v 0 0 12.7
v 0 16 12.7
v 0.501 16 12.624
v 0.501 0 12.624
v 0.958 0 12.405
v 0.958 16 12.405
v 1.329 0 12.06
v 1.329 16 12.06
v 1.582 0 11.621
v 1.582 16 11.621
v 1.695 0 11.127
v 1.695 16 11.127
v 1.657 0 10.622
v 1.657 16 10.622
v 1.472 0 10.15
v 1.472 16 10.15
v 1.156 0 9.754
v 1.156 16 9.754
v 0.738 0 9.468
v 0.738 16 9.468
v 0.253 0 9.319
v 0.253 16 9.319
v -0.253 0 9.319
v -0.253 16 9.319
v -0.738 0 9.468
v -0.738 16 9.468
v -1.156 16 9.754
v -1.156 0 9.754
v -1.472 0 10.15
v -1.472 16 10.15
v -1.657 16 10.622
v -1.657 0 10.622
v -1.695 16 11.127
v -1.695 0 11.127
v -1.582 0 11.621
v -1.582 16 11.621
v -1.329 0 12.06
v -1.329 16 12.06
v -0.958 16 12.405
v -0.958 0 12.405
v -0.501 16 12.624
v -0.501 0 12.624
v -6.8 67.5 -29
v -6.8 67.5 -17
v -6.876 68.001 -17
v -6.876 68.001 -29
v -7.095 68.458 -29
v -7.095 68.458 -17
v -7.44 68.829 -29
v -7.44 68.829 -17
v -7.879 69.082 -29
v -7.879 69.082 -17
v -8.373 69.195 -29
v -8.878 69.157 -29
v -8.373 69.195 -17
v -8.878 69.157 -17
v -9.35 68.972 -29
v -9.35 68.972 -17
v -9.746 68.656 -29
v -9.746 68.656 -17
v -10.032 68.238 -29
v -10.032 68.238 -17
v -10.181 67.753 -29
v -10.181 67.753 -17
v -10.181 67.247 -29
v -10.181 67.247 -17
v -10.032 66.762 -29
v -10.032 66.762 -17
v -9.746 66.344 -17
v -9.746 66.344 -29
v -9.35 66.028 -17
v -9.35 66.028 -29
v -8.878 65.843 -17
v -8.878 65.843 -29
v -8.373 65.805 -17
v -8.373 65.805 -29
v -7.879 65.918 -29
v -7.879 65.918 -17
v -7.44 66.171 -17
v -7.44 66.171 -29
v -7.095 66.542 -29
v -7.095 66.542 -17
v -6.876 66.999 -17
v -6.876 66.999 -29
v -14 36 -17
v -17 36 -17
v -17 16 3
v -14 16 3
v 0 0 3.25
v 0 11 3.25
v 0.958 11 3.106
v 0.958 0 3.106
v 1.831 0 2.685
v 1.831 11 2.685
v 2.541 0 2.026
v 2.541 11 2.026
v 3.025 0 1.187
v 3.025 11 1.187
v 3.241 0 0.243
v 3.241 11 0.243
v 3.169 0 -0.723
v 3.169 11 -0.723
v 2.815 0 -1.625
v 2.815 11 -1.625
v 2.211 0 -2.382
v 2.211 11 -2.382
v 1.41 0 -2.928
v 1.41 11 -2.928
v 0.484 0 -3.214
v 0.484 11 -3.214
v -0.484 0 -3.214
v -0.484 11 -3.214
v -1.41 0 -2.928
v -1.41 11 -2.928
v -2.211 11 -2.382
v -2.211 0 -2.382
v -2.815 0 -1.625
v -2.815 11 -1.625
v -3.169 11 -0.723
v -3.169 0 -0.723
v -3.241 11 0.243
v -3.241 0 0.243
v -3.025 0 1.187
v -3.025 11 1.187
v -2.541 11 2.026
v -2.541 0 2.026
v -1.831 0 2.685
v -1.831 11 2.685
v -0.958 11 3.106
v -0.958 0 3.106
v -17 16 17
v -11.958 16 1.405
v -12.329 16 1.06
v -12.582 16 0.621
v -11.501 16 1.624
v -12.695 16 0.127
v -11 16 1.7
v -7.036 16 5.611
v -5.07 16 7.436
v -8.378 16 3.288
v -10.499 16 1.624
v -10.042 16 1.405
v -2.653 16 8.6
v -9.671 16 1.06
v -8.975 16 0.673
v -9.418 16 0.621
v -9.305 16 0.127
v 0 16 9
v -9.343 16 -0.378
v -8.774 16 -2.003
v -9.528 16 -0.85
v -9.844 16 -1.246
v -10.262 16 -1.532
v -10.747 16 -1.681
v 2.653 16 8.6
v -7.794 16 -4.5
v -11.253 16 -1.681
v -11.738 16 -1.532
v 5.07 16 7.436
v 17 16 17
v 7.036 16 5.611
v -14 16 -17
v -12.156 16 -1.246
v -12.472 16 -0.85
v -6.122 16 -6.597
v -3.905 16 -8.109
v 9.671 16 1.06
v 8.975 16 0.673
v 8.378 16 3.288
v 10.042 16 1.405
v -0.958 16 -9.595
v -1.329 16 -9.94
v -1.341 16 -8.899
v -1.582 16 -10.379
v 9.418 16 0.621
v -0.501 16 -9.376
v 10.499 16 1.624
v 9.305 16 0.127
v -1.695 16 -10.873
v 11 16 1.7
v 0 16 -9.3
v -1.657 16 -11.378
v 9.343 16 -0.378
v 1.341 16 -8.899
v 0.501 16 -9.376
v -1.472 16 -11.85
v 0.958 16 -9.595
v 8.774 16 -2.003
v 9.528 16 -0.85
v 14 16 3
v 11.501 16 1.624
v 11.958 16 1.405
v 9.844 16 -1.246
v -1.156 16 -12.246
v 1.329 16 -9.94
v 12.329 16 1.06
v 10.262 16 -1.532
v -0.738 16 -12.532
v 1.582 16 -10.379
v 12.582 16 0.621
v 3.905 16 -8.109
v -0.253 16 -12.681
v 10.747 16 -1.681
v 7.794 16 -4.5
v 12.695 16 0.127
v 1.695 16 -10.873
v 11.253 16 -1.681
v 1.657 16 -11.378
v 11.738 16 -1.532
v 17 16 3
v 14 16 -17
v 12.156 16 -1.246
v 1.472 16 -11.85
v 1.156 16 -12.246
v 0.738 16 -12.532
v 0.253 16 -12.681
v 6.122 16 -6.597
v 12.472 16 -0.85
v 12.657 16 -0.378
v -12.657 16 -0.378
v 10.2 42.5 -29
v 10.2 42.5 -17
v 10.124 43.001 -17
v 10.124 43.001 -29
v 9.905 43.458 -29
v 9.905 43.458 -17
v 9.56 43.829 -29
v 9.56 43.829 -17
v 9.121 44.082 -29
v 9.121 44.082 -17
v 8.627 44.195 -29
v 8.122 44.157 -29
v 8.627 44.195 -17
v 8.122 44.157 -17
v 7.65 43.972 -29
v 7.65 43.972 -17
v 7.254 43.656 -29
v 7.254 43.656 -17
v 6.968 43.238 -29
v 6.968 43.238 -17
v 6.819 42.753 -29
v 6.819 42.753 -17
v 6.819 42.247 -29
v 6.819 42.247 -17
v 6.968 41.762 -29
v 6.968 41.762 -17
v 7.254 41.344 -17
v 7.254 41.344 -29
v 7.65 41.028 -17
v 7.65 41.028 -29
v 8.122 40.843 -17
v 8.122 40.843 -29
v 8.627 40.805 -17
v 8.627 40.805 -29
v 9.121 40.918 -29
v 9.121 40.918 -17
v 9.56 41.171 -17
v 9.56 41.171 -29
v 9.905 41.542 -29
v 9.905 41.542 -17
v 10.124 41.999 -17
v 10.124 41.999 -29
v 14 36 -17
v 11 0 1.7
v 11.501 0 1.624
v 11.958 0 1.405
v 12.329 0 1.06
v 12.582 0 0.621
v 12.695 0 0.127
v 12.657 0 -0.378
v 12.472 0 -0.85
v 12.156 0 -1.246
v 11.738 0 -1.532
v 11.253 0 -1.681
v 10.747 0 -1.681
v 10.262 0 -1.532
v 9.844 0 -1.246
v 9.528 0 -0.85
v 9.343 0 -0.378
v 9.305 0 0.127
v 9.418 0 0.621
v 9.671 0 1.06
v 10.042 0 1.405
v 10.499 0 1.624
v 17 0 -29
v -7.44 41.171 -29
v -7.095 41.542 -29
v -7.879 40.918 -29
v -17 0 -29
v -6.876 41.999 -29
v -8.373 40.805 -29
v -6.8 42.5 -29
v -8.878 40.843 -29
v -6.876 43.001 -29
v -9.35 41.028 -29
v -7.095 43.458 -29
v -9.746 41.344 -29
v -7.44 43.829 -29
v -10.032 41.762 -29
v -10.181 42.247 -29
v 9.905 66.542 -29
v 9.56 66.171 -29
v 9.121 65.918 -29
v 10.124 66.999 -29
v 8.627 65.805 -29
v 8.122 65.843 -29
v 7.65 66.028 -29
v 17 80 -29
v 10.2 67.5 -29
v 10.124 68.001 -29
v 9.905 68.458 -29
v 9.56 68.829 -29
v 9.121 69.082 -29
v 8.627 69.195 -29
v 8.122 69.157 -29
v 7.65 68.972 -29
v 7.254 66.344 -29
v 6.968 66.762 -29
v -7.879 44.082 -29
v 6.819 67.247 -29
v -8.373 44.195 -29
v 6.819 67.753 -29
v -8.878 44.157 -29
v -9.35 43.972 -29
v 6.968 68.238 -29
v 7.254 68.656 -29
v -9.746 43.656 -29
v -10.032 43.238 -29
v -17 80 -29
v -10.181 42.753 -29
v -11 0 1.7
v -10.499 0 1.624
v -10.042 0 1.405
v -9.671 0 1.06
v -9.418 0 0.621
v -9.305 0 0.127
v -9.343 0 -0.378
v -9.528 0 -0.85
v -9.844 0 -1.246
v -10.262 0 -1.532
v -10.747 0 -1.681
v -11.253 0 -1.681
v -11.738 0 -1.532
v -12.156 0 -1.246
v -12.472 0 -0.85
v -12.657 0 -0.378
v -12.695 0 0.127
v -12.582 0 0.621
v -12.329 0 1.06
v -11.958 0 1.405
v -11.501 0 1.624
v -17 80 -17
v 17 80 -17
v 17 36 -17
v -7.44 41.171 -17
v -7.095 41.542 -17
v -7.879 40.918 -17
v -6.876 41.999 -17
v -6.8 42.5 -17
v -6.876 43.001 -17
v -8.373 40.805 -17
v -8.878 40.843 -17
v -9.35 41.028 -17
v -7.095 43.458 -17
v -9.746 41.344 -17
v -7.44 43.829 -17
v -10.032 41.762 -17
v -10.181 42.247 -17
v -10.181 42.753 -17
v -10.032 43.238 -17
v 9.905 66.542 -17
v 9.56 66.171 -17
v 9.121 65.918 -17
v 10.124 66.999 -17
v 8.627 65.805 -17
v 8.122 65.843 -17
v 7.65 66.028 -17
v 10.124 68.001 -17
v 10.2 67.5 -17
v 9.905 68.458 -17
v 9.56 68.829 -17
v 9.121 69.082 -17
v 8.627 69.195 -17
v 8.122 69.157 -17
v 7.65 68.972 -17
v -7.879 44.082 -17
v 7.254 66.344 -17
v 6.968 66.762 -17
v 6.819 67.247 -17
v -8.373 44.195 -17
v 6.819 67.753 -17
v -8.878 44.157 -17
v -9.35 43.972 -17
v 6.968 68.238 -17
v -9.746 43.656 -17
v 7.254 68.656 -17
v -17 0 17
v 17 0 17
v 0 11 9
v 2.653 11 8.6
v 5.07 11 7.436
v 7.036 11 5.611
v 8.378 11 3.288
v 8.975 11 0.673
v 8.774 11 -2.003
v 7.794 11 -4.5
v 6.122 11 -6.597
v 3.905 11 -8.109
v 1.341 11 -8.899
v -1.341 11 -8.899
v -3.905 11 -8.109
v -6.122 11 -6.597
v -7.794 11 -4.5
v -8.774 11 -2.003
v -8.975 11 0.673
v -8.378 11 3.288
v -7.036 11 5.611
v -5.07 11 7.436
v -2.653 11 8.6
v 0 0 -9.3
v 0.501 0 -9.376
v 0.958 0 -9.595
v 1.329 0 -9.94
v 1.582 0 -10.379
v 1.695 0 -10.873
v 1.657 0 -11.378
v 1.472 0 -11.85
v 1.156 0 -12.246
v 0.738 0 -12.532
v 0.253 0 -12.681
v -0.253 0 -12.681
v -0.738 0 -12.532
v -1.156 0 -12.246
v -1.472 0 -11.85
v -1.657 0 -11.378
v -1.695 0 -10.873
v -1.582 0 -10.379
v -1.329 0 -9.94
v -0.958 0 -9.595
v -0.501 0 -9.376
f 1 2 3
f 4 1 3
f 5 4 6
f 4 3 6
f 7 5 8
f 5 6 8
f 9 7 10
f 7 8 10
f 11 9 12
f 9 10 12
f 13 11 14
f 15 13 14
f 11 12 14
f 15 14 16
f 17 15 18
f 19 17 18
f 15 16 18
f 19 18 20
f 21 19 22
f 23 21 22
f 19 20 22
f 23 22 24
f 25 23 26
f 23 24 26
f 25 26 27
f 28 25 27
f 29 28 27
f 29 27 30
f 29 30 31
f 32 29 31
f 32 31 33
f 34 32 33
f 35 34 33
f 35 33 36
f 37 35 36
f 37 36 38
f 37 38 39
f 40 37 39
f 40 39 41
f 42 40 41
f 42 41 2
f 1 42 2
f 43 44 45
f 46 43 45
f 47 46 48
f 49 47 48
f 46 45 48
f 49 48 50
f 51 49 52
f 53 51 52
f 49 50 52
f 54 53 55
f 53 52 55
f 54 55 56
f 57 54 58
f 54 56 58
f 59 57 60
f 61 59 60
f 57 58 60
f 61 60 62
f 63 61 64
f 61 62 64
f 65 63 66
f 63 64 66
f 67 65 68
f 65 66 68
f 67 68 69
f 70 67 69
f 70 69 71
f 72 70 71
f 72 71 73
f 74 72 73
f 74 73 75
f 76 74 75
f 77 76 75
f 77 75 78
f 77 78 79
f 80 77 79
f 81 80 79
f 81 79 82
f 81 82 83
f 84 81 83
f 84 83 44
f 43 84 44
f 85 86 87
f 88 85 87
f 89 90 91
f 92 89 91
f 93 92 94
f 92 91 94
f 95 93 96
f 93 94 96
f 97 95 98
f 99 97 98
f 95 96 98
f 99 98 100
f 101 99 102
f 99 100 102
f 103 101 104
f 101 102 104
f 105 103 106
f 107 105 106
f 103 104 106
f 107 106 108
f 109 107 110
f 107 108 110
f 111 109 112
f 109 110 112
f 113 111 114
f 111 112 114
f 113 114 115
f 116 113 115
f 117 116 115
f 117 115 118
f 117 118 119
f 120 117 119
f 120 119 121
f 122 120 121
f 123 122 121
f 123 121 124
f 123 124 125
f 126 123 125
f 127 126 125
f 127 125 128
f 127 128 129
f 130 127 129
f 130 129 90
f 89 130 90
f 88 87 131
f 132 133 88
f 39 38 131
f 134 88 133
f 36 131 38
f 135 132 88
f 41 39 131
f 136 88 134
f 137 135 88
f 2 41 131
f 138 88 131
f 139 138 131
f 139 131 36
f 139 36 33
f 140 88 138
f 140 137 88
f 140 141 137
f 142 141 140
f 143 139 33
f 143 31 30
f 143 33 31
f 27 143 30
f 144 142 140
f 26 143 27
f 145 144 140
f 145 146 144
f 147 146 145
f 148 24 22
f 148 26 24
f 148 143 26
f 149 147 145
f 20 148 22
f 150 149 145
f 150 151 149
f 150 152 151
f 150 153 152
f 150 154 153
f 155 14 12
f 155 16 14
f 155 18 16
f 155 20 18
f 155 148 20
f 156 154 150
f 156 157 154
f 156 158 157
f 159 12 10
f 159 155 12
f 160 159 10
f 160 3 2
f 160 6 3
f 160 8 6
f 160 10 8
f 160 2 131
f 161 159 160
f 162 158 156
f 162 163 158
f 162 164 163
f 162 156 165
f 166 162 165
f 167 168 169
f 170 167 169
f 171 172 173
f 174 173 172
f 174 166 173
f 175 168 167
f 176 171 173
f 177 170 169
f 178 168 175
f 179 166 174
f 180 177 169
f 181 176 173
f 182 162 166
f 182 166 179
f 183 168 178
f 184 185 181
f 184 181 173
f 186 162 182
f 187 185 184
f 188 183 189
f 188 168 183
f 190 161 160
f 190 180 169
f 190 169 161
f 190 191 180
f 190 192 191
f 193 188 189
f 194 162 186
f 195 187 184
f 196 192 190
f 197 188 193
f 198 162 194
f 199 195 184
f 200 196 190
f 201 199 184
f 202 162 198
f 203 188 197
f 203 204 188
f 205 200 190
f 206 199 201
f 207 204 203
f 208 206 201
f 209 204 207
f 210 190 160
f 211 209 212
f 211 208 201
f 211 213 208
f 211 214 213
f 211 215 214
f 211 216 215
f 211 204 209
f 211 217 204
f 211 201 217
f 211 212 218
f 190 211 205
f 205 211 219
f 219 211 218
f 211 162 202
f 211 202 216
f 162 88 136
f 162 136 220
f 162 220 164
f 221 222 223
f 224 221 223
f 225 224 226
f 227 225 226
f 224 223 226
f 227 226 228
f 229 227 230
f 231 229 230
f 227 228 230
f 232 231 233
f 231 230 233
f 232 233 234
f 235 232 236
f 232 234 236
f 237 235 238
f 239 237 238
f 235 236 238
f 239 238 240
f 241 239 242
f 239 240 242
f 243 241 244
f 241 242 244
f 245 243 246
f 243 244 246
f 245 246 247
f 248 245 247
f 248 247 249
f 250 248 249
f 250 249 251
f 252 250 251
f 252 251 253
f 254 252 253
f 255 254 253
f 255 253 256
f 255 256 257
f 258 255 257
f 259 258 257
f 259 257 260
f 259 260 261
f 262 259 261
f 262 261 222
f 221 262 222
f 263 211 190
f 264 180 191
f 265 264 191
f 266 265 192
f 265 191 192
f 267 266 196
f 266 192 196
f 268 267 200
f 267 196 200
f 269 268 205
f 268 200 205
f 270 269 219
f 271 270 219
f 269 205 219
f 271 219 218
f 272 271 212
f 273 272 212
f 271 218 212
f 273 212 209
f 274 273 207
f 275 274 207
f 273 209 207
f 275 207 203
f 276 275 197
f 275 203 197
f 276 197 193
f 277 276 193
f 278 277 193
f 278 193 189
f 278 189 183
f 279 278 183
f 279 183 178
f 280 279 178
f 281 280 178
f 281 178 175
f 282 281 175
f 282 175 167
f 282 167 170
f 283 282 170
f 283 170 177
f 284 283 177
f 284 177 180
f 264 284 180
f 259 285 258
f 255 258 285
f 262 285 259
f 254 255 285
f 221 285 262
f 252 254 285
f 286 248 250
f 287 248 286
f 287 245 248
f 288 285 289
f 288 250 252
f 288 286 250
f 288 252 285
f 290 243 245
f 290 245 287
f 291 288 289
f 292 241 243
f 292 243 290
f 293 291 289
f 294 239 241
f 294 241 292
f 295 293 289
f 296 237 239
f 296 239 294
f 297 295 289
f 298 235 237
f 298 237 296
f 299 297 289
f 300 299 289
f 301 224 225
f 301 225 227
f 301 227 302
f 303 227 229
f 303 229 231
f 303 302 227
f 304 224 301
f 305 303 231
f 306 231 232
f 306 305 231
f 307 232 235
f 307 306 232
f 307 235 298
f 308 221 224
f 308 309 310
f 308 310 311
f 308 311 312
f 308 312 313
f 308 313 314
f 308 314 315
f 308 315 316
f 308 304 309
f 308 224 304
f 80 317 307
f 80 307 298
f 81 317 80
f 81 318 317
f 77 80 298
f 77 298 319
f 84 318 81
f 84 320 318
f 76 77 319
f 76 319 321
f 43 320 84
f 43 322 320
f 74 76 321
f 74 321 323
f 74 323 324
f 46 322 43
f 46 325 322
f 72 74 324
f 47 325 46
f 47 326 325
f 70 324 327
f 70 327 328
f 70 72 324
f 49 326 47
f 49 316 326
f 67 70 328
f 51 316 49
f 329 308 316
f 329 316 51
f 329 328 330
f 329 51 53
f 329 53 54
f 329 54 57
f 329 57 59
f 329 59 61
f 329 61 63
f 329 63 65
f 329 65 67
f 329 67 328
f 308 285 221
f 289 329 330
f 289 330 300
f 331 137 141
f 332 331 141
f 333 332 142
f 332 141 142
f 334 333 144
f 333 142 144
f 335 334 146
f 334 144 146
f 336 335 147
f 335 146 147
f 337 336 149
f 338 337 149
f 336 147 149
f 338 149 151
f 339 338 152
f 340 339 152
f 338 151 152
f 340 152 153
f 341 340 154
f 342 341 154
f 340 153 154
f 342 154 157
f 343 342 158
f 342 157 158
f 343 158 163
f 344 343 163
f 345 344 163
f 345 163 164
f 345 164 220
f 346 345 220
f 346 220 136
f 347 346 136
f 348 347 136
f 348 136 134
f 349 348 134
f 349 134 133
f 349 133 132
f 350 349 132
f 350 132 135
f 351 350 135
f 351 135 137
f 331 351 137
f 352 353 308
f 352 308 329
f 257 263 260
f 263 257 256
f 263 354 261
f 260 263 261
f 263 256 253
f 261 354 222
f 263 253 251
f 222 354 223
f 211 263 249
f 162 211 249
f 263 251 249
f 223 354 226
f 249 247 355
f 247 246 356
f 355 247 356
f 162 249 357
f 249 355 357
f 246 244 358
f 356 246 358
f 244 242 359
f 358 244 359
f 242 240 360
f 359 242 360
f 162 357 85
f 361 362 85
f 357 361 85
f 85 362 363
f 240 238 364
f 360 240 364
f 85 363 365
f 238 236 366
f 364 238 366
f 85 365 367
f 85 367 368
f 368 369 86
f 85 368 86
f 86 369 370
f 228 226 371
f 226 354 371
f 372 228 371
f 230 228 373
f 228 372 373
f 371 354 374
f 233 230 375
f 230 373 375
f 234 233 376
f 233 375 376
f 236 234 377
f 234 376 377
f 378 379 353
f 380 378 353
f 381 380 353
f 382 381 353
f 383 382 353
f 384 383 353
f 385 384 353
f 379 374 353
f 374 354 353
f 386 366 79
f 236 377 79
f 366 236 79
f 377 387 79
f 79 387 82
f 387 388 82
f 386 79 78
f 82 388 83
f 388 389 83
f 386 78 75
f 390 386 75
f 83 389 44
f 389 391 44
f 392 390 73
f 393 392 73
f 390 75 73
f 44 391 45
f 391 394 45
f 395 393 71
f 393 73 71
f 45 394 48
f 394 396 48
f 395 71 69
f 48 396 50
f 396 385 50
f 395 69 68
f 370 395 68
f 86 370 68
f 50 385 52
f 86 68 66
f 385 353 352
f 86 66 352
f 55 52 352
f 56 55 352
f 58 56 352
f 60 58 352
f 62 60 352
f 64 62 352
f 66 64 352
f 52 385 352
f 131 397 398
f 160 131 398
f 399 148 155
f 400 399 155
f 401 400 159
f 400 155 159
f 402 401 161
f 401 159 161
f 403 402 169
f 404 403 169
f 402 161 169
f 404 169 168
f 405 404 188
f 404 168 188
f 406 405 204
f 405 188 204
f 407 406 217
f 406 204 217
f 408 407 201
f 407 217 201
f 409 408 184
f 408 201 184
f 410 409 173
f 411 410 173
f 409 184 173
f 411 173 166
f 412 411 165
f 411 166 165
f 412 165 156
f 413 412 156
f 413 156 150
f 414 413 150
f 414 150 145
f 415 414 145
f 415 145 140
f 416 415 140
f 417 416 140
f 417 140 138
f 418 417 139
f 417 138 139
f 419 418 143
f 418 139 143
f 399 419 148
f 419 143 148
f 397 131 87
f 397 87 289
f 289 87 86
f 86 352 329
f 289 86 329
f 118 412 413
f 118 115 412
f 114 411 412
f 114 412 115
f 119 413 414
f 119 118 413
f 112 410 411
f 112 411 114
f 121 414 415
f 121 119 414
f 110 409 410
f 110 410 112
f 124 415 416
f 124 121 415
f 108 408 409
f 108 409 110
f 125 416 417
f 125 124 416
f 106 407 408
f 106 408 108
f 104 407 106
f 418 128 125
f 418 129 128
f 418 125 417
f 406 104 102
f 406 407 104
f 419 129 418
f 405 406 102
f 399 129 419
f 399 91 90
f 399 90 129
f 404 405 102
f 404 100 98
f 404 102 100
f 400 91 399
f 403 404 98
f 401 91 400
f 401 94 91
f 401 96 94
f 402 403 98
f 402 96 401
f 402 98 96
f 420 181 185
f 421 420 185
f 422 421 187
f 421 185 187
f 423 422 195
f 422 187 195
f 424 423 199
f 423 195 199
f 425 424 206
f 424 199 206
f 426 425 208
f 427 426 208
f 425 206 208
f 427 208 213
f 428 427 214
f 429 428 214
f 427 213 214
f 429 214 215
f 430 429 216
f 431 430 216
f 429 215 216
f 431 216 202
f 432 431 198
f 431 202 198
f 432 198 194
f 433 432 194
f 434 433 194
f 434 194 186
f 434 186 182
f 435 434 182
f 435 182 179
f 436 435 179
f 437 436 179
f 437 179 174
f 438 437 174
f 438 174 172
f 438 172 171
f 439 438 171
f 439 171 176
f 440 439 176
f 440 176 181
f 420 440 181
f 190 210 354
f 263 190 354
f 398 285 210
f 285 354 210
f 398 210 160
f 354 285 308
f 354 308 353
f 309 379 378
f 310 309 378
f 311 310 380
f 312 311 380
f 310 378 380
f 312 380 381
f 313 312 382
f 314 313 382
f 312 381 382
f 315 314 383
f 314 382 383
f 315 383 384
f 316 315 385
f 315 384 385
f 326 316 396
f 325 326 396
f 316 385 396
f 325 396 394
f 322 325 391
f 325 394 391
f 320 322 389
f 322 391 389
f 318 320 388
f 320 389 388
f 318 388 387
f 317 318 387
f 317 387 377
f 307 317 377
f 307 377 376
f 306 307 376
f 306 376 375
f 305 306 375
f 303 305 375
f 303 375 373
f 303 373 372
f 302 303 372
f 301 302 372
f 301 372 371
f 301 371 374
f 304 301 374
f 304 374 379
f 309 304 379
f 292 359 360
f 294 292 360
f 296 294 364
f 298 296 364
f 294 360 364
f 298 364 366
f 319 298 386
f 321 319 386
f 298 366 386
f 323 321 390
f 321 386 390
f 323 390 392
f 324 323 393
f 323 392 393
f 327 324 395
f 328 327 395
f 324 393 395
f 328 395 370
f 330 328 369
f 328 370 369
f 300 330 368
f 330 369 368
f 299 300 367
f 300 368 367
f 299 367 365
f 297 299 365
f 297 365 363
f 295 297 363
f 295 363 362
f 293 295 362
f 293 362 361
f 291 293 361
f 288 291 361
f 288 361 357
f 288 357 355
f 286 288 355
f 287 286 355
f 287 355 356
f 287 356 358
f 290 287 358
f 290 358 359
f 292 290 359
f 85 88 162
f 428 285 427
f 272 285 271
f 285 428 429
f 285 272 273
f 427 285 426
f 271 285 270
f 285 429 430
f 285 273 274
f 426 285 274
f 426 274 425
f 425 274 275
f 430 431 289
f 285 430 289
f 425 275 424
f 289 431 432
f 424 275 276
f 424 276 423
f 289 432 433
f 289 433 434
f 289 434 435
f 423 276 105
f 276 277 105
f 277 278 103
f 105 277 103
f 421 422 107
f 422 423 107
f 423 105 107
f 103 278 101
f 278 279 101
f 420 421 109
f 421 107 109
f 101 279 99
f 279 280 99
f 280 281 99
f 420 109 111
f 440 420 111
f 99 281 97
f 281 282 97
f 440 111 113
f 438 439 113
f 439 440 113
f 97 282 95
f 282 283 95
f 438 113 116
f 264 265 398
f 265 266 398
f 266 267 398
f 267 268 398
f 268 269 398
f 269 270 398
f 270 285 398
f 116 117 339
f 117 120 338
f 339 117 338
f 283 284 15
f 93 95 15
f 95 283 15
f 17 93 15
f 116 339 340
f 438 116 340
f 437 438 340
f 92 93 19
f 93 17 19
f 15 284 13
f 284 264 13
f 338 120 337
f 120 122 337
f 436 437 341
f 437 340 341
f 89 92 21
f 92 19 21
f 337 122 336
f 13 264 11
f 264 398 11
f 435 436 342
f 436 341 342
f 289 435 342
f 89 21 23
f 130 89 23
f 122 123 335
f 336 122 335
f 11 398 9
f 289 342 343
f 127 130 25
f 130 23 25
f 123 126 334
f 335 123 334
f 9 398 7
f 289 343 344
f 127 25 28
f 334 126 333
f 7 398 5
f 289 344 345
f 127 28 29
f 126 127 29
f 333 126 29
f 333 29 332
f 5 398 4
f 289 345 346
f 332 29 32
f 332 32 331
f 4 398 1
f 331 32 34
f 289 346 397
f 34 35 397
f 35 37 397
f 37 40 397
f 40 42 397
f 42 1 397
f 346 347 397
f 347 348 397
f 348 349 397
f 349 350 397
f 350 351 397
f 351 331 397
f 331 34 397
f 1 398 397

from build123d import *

# Parameters (mm, degrees)
SKETCH1_W           = 34
SKETCH1_H           = 34
BOSS_EXTRUDE1_DEPTH = 16
SKETCH2_W           = 34
SKETCH2_H           = 80
BOSS_EXTRUDE2_DEPTH = 12
SKETCH3_R           = 3.25
SKETCH3_R_2         = 1.7
CUT_EXTRUDE2_DEPTH  = 73.291078288
SKETCH4_R           = 9
CUT_EXTRUDE3_DEPTH  = 5
SKETCH5_R           = 1.7
CUT_EXTRUDE4_DEPTH  = 89.572004606
BOSS_EXTRUDE3_DEPTH = 3
BOSS_EXTRUDE4_DEPTH = 3


with BuildPart() as part:
    # Sketch1 → Boss-Extrude1 (new body)
    with BuildSketch(Plane(origin=(0, 0, 0), x_dir=(1, 0, 0), z_dir=(0, 1, 0))):
        Rectangle(SKETCH1_W, SKETCH1_H)
    extrude(amount=BOSS_EXTRUDE1_DEPTH)

    # Sketch2 → Boss-Extrude2 (add)
    with BuildSketch(Plane(origin=(0, 0, -17), x_dir=(-1, 0, 0), z_dir=(0, 0, -1))):
        with Locations((0, 40)):
            Rectangle(SKETCH2_W, SKETCH2_H)
    extrude(amount=BOSS_EXTRUDE2_DEPTH)

    # Sketch3 → Cut-Extrude2 (cut, through all)
    with BuildSketch(Plane(origin=(0, 16, 0), x_dir=(1, 0, 0), z_dir=(0, 1, 0))):
        with Locations(Location((0, 0, 0), (0, 0, 270))):
            Circle(SKETCH3_R)
        with Locations(Location((0, 11, 0), (0, 0, 270))):
            Circle(SKETCH3_R_2)
        with Locations(Location((11, 0, 0), (0, 0, 270))):
            Circle(SKETCH3_R_2)
        with Locations(Location((0, -11, 0), (0, 0, 270))):
            Circle(SKETCH3_R_2)
        with Locations(Location((-11, 0, 0), (0, 0, 270))):
            Circle(SKETCH3_R_2)
    extrude(amount=-CUT_EXTRUDE2_DEPTH, mode=Mode.SUBTRACT)

    # Sketch4 → Cut-Extrude3 (cut)
    with BuildSketch(Plane(origin=(0, 16, 0), x_dir=(1, 0, 0), z_dir=(0, 1, 0))):
        with Locations(Location((0, 0, 0), (0, 0, 270))):
            Circle(SKETCH4_R)
    extrude(amount=-CUT_EXTRUDE3_DEPTH, mode=Mode.SUBTRACT)

    # Sketch5 → Cut-Extrude4 (cut, through all)
    with BuildSketch(Plane.XY.offset(-17)):
        with Locations((-8.5, 67.5)):
            Circle(SKETCH5_R)
        with Locations((8.5, 67.5)):
            Circle(SKETCH5_R)
        with Locations((8.5, 42.5)):
            Circle(SKETCH5_R)
        with Locations((-8.5, 42.5)):
            Circle(SKETCH5_R)
    extrude(amount=-CUT_EXTRUDE4_DEPTH, mode=Mode.SUBTRACT)

    # Sketch6 → Boss-Extrude3 (add)
    with BuildSketch(Plane(origin=(17, 0, 0), x_dir=(0, 0, -1), z_dir=(1, 0, 0))):
        Polygon((17, 16), (-3, 16), (17, 36), align=None)
    extrude(amount=-BOSS_EXTRUDE3_DEPTH)

    # Sketch7 → Boss-Extrude4 (add)
    with BuildSketch(Plane.ZY.offset(17)):
        Polygon((-17, 16), (-17, 36), (3, 16), align=None)
    extrude(amount=-BOSS_EXTRUDE4_DEPTH)


solid = part.part
